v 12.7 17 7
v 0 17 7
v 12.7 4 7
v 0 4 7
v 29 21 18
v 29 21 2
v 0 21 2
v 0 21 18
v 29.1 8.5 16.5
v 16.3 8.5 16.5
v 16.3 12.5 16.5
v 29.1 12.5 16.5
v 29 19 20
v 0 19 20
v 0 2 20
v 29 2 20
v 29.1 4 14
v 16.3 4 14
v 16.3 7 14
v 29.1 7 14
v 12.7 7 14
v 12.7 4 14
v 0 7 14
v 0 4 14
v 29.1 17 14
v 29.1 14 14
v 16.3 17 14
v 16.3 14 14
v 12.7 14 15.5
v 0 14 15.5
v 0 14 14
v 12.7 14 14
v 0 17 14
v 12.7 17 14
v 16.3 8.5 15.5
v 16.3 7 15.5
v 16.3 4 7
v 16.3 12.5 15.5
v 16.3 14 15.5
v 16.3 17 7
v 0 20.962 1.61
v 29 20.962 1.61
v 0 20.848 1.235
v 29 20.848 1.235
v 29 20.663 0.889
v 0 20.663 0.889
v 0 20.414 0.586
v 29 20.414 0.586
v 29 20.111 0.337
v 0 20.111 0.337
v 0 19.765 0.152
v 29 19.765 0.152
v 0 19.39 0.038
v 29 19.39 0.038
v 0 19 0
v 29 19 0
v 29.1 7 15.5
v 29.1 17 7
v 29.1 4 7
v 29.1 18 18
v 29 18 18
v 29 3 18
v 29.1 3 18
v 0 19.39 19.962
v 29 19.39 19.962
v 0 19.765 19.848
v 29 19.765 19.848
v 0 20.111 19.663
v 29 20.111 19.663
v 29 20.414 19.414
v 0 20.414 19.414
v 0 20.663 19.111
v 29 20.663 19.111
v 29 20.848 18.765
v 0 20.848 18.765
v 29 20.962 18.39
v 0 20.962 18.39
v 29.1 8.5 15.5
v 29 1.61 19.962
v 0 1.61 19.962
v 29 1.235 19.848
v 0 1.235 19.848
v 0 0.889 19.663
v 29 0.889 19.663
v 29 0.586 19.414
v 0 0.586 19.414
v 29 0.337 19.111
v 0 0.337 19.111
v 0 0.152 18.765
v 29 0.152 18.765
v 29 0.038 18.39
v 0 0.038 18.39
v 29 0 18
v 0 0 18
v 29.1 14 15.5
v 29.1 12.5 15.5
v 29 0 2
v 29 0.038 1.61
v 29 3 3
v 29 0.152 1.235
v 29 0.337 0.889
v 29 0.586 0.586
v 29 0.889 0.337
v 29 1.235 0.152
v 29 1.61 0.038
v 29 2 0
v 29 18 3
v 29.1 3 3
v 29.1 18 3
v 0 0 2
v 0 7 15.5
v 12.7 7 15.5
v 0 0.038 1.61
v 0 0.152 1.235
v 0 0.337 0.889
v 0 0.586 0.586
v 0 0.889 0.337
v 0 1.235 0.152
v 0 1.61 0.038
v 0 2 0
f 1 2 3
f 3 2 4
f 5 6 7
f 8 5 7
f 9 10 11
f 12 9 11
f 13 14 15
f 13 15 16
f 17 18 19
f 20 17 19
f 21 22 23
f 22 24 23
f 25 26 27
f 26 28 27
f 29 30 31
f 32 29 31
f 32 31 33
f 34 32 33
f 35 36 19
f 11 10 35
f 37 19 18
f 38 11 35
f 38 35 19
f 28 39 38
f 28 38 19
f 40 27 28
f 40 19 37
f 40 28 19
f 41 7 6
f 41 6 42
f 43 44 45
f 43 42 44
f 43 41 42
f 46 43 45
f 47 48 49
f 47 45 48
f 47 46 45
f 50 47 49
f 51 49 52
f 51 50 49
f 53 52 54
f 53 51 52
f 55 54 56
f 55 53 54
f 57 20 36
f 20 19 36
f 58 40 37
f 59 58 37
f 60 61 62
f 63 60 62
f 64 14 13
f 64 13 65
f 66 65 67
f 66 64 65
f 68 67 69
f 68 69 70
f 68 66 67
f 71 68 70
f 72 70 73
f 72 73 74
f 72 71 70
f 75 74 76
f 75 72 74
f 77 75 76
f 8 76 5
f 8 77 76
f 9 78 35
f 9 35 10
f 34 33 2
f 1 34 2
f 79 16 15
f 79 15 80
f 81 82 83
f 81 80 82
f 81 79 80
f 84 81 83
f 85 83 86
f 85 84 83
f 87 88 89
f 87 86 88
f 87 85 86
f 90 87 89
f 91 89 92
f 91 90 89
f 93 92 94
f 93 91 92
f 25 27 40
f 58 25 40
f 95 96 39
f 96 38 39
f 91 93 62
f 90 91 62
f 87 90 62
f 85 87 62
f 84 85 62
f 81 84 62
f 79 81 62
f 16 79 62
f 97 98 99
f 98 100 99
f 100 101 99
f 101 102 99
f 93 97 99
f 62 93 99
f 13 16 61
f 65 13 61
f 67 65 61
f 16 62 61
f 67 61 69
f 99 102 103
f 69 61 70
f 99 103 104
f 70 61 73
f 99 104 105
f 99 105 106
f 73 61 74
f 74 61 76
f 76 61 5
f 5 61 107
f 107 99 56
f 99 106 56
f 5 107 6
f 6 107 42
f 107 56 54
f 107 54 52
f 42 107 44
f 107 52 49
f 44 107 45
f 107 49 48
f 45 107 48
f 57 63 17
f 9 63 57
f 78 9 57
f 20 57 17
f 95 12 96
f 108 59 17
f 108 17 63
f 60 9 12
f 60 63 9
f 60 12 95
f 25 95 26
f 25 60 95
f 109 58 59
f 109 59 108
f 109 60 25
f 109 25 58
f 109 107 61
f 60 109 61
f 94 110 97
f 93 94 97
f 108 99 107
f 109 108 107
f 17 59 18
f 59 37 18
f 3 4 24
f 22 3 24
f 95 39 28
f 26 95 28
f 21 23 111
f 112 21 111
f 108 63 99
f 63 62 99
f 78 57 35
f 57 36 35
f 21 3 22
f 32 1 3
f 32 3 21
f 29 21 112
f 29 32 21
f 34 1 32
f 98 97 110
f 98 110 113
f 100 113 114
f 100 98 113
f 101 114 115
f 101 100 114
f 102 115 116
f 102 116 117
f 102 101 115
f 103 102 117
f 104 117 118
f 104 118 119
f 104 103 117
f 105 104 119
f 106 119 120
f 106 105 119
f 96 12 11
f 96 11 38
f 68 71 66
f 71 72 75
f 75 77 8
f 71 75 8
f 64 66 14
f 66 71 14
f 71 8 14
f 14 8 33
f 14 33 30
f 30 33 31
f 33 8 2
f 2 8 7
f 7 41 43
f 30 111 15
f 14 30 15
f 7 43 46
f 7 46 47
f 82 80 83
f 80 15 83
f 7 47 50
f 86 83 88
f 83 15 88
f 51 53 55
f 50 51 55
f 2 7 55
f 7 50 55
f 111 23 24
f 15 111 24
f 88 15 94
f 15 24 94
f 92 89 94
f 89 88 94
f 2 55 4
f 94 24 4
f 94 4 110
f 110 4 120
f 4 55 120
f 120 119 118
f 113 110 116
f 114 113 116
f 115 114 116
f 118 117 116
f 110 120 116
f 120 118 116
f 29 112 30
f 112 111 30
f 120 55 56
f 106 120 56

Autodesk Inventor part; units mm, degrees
ref_plane "YZ Plane" through (0, 0, 0) normal (1, 0, 0) x (0, 1, 0)
ref_plane "XZ Plane" through (0, 0, 0) normal (0, 1, 0) x (-1, 0, 0)
ref_plane "XY Plane" through (0, 0, 0) normal (0, 0, 1) x (1, 0, 0)
sketch "Sketch1" plane through (0, 0, 0) normal (0, 0, 1) x (1, 0, 0)
  line L0 (0, 0) -> (29, 0)
  line L1 (29, 0) -> (29, 21)
  line L2 (29, 21) -> (0, 21)
  line L3 (0, 21) -> (0, 0)
  dimension "d0" = 29
  dimension "d1" = 21
extrude "Extrusion1" add sketch "Sketch1" along normal blind 20
sketch "Sketch2" plane through (29, 0, 0) normal (1, 0, 0) x (0, 0, -1)
  line L0 (-7, 4) -> (-14, 4)
  line L1 (-14, 4) -> (-14, 17)
  line L2 (-14, 17) -> (-7, 17)
  line L3 (-7, 17) -> (-7, 4)
  line L4 (-20, 0) -> (-20, 21) construction
  line L5 (-14, 7) -> (-15.5, 7)
  line L6 (-15.5, 7) -> (-15.5, 14)
  line L7 (-15.5, 14) -> (-14, 14)
  line L8 (-14, 14) -> (-14, 7)
  line L9 (-15.5, 17) -> (-7, 17)
  line L10 (0, 21) -> (-20, 21) construction
  line L11 (-15.5, 12.5) -> (-16.5, 12.5)
  line L12 (-16.5, 12.5) -> (-16.5, 8.5)
  line L13 (-16.5, 8.5) -> (-15.5, 8.5)
  line L14 (-15.5, 8.5) -> (-15.5, 12.5)
  line L15 (0, 0) -> (0, 21) projected
  point P0 (-14, 10.5)
  point P1 (-20, 10.5)
  point P2 (-11.25, 17)
  point P3 (-10, 21)
  point P4 (-15.5, 10.5)
  dimension "d4" = 7
  dimension "d5" = 13
  dimension "d6" = 1.5
  dimension "d7" = 7
  dimension "d12" = 4
  dimension "d13" = 1
  dimension "d14" = 7
extrude "Extrusion2" cut sketch "Sketch2" against normal blind 12.7
sketch "Sketch3" plane through (0, 0, 0) normal (-1, 0, 0) x (0, 0, 1)
  line L0 (14, 14) -> (14, 17) projected
  line L1 (15.5, 14) -> (14, 14) projected
  line L2 (15.5, 7) -> (15.5, 14) projected
  line L3 (14, 7) -> (15.5, 7) projected
  line L4 (7, 4) -> (14, 4) projected
  line L5 (7, 17) -> (7, 4) projected
  line L6 (14, 17) -> (7, 17) projected
  line L7 (14, 4) -> (14, 7) projected
  point P0 (0, 0)
extrude "Extrusion3" cut sketch "Sketch3" against normal blind 12.7
sketch "Sketch4" plane through (29, 0, 0) normal (1, 0, 0) x (0, 0, -1)
  line L0 (-18, 3) -> (-3, 3)
  line L1 (-3, 3) -> (-3, 18)
  line L2 (-3, 18) -> (-18, 18)
  line L3 (-18, 18) -> (-18, 3)
  line L4 (-20, 0) -> (-20, 21) projected
  line L5 (-15.5, 8.5) -> (-16.5, 8.5) projected
  line L6 (-15.5, 7) -> (-15.5, 8.5) projected
  line L7 (-14, 7) -> (-15.5, 7) projected
  line L8 (-14, 4) -> (-14, 7) projected
  line L9 (-7, 4) -> (-14, 4) projected
  line L10 (-7, 17) -> (-7, 4) projected
  line L11 (-14, 17) -> (-7, 17) projected
  line L12 (-14, 14) -> (-14, 17) projected
  line L13 (-15.5, 14) -> (-14, 14) projected
  line L14 (-15.5, 12.5) -> (-15.5, 14) projected
  line L15 (-16.5, 12.5) -> (-15.5, 12.5) projected
  line L16 (-16.5, 8.5) -> (-16.5, 12.5) projected
  point P0 (0, 0)
  point P1 (-18, 10.5)
  point P2 (-20, 10.5)
  dimension "d15" = 15
  dimension "d16" = 15
  dimension "d17" = 2
extrude "Extrusion4" add sketch "Sketch4" along normal blind 0.1
fillet "Fillet1" radius 2 4 edges at (14.5, 0, 0) (14.5, 0, 20) (14.5, 21, 20) (14.5, 21, 0)
properties part number "Ethernet Port" material "ABS Plastic"
